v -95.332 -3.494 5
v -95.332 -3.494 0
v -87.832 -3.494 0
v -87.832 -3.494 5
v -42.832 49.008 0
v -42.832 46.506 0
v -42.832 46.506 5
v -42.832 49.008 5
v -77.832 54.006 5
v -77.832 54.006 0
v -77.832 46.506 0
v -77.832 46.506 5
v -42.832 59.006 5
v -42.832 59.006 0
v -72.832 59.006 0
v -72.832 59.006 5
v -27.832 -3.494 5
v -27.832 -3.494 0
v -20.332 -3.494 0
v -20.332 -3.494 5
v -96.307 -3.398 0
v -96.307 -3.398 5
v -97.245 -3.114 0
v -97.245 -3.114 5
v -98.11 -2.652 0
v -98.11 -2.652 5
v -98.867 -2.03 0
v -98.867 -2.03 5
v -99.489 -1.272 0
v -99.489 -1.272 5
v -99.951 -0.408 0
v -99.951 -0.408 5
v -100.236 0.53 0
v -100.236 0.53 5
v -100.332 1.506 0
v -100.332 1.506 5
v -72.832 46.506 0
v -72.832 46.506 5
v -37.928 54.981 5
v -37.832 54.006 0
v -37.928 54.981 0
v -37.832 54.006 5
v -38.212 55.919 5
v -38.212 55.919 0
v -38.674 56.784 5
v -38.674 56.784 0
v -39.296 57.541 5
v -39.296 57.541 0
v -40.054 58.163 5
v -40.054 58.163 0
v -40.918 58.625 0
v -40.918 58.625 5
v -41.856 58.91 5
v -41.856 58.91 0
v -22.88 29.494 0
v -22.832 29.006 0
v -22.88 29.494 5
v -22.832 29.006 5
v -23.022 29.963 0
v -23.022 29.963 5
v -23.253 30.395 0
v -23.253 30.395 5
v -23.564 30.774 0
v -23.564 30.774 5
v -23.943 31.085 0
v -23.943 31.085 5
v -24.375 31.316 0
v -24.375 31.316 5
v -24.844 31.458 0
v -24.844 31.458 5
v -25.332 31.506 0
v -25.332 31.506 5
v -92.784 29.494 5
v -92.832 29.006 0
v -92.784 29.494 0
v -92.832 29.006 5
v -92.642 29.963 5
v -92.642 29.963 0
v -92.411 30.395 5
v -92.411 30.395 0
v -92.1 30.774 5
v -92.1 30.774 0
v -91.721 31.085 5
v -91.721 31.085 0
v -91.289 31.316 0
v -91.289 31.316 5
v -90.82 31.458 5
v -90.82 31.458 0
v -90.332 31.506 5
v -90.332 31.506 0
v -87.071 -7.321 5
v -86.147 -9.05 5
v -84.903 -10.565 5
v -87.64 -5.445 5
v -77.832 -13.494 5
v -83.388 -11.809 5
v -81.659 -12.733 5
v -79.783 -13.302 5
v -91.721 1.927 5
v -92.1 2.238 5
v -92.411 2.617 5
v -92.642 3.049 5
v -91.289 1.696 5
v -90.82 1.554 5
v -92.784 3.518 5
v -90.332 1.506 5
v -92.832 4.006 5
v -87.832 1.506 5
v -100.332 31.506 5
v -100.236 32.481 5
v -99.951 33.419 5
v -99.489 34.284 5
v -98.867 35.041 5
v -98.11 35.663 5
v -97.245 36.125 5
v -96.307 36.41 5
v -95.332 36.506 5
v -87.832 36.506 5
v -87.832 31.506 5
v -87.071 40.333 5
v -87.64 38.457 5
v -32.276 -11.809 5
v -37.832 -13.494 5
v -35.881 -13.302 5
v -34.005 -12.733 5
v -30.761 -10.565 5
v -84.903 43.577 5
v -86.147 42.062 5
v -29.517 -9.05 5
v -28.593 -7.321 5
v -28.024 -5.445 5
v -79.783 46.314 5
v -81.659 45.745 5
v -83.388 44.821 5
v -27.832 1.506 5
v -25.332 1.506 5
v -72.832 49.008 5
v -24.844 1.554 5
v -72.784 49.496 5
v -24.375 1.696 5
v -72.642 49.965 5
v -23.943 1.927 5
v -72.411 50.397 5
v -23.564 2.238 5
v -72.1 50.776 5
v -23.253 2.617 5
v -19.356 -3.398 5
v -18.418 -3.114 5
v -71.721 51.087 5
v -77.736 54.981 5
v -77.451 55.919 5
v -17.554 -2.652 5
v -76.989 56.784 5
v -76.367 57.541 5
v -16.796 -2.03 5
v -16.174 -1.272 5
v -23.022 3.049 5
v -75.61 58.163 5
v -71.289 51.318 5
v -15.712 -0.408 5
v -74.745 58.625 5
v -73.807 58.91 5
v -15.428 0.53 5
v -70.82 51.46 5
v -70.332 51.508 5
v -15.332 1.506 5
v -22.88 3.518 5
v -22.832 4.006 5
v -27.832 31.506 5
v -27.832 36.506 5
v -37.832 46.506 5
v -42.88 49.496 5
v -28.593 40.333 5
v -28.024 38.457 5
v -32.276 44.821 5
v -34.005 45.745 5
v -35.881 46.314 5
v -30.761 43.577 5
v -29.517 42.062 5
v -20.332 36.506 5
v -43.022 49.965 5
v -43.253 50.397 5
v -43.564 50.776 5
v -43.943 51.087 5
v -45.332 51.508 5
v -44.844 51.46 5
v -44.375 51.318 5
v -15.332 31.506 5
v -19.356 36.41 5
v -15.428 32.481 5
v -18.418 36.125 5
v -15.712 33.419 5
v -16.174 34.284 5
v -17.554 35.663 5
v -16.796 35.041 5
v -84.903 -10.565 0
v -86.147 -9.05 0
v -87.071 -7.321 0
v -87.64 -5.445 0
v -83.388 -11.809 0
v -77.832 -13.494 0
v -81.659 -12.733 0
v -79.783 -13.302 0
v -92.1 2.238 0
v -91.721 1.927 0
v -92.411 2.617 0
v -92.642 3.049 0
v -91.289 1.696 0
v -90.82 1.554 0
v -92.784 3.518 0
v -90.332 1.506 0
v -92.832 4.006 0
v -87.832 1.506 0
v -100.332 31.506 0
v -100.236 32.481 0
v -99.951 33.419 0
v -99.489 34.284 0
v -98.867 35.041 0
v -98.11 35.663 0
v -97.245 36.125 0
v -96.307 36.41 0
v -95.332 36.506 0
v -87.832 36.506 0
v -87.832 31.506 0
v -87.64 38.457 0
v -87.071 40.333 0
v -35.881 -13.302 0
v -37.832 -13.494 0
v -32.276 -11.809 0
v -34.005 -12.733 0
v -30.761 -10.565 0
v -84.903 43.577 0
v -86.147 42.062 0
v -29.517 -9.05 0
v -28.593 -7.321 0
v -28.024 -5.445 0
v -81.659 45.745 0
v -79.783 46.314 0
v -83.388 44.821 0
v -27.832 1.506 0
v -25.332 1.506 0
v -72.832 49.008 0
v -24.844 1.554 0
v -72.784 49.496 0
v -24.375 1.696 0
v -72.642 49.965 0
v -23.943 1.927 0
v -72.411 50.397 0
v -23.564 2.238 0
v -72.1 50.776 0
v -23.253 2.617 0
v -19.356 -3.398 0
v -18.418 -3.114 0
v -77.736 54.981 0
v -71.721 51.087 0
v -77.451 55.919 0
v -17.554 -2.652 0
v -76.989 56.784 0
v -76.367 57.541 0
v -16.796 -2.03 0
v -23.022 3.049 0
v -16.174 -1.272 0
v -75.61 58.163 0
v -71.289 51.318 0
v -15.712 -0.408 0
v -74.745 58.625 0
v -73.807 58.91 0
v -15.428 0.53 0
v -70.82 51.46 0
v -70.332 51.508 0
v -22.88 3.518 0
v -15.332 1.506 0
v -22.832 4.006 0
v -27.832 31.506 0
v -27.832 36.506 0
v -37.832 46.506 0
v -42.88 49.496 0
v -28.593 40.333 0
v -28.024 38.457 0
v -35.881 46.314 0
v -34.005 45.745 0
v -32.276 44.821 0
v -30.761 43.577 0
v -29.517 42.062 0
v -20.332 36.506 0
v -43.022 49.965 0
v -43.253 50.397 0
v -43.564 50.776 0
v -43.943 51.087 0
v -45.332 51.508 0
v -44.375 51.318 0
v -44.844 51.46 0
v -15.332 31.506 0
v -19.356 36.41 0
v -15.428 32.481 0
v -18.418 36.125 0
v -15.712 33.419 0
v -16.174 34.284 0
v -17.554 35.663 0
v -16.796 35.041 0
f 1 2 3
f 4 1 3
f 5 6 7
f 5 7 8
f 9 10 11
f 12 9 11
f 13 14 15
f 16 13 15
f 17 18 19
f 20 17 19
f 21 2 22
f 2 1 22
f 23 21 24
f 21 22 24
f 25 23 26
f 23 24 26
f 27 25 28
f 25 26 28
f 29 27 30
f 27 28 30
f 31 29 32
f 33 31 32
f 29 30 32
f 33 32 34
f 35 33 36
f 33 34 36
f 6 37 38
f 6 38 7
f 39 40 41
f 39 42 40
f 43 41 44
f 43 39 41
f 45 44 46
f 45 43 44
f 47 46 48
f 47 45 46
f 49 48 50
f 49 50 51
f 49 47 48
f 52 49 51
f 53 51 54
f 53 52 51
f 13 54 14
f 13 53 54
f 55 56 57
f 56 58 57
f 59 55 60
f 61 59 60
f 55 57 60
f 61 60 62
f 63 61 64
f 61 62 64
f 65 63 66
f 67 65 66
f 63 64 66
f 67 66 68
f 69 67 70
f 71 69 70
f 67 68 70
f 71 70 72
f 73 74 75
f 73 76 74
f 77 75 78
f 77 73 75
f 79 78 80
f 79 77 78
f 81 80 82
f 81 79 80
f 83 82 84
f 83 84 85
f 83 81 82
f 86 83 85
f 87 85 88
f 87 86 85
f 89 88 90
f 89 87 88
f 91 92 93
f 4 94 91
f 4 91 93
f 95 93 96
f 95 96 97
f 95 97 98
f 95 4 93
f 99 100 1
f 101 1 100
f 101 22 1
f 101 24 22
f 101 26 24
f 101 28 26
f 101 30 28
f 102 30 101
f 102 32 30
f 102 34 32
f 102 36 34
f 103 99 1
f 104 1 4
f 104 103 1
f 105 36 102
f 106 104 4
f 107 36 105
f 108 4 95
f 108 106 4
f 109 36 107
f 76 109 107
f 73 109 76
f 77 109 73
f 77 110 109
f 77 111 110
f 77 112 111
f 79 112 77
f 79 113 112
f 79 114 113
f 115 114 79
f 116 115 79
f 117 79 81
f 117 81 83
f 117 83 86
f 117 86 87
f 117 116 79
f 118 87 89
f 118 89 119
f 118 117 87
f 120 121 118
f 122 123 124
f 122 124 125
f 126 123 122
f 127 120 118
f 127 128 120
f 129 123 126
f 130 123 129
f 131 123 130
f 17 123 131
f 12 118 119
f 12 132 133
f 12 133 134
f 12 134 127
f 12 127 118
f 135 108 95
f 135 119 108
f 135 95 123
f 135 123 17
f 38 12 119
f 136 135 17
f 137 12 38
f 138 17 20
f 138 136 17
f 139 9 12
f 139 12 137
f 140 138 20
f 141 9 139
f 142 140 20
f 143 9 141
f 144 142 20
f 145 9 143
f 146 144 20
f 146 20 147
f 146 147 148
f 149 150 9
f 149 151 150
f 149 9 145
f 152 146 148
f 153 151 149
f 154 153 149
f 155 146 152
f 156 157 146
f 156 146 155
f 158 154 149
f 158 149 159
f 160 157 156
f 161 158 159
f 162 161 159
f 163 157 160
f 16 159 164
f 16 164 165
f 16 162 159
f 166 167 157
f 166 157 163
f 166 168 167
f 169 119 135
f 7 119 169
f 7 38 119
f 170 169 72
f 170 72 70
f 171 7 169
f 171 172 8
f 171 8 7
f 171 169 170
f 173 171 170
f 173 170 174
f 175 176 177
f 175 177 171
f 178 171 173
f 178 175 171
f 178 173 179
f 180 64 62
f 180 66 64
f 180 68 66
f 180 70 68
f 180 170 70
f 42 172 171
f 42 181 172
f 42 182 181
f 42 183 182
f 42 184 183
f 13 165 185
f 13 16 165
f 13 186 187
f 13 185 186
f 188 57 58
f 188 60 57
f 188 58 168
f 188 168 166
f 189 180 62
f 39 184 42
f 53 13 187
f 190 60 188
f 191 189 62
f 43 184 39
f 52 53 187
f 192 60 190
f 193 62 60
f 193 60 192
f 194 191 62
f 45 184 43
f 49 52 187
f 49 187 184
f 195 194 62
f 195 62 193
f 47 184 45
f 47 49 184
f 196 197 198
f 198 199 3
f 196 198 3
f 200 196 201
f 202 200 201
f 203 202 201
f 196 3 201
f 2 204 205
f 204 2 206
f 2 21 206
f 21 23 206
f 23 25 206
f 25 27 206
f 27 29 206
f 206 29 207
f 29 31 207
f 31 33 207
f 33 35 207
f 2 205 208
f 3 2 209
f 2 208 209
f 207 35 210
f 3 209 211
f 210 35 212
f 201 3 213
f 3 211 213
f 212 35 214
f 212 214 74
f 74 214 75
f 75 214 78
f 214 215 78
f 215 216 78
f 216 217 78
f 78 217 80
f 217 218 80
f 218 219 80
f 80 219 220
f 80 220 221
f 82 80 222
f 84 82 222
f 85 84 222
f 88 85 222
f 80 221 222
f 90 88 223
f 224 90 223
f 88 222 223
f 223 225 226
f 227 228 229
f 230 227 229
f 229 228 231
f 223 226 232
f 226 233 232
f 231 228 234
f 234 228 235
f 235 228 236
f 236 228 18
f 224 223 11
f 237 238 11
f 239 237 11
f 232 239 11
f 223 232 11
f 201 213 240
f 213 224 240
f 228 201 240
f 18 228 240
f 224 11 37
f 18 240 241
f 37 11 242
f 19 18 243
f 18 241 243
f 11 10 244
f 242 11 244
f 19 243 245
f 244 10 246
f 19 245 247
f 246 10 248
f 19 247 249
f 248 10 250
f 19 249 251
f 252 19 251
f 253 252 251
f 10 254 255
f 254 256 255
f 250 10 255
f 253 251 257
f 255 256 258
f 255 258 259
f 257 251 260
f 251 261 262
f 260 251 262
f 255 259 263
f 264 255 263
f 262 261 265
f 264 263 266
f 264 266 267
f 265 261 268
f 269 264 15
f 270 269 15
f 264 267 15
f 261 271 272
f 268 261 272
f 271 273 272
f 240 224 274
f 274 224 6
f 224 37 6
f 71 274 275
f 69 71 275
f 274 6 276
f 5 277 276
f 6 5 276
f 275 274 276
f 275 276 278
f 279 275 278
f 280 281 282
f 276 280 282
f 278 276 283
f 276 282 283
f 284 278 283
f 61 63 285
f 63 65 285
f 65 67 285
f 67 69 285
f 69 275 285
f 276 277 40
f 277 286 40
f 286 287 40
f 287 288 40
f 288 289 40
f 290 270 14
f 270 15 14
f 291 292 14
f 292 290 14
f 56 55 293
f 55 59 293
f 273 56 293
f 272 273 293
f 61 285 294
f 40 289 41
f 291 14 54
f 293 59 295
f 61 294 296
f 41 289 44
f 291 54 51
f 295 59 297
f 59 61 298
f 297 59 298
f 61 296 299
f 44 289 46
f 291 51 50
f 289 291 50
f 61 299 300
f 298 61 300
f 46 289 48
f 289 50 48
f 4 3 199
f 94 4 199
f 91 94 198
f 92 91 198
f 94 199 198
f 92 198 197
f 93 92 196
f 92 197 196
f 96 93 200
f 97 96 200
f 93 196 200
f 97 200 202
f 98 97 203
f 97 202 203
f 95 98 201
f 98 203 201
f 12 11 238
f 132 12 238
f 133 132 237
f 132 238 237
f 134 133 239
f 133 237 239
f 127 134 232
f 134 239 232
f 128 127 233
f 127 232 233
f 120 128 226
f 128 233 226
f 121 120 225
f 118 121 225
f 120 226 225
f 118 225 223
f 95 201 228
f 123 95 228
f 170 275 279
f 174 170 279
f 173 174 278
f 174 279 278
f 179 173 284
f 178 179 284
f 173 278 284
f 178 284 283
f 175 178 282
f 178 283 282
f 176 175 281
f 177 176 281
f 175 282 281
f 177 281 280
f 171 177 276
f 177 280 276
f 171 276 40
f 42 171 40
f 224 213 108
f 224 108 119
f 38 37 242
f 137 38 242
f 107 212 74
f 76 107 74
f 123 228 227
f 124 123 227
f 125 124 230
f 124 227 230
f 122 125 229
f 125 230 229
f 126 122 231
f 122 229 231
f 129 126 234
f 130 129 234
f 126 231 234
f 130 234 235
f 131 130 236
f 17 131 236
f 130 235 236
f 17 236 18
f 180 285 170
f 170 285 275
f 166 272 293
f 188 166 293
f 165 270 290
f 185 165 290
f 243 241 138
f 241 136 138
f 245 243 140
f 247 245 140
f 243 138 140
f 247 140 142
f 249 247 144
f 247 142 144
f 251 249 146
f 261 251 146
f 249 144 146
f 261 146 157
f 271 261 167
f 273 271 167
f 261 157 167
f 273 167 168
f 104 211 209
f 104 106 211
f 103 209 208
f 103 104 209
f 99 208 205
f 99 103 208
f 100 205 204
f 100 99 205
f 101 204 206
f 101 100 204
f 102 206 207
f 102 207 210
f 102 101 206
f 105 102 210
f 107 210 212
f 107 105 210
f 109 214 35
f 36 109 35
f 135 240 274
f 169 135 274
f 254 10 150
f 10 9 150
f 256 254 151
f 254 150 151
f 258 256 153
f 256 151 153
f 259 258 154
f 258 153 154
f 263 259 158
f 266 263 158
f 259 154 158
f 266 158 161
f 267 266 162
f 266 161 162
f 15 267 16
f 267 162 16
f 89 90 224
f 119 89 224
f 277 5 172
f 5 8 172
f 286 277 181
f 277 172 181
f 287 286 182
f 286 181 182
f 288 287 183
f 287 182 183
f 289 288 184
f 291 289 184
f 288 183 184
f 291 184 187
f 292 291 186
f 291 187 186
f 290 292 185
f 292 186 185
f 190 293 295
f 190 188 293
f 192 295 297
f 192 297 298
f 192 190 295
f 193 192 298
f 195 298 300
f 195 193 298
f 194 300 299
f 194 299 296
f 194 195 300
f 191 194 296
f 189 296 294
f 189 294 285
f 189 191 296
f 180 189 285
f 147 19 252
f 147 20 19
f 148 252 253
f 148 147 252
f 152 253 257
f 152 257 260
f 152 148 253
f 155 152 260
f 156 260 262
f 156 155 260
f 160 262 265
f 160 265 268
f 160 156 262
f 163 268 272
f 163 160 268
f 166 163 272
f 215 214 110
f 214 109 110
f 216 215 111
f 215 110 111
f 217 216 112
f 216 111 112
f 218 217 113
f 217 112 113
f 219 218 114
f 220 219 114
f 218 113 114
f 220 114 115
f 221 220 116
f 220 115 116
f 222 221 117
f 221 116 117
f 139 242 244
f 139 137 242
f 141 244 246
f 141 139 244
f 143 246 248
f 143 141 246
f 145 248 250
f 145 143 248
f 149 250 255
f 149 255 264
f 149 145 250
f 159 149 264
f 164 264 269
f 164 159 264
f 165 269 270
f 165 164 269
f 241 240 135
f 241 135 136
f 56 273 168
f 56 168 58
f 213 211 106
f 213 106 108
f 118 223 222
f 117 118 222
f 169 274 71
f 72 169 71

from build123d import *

# Parameters (mm, degrees)
SKETCH1_W           = 5
SKETCH1_H           = 30
SKETCH1_W_2         = 30
SKETCH1_H_2         = 5.002209569
BOSS_EXTRUDE2_DEPTH = 5
FILLET1_R           = 5
FILLET2_R           = 2.5


with BuildPart() as part:
    # Sketch1 → Boss-Extrude2 (new body)
    with BuildSketch(Plane.XY):
        with BuildLine():
            Line((-77.831835846, -13.494171848), (-37.831835846, -13.494171848))
            ThreePointArc((-37.831835846, -13.494171848), (-30.760768034, -10.56523966), (-27.831835846, -3.494171848))
            Line((-27.831835846, -3.494171848), (-15.331835846, -3.494171848))
            Line((-15.331835846, -3.494171848), (-15.331835846, 36.505828152))
            Line((-15.331835846, 36.505828152), (-27.831835846, 36.505828152))
            ThreePointArc((-27.831835846, 36.505828152), (-30.760768034, 43.576895964), (-37.831835846, 46.505828152))
            Line((-37.831835846, 46.505828152), (-37.831835846, 59.005828152))
            Line((-37.831835846, 59.005828152), (-77.831835846, 59.005828152))
            Line((-77.831835846, 59.005828152), (-77.831835846, 46.505828152))
            ThreePointArc((-77.831835846, 46.505828152), (-84.902903658, 43.576895964), (-87.831835846, 36.505828152))
            Line((-87.831835846, 36.505828152), (-100.331835846, 36.505828152))
            Line((-100.331835846, 36.505828152), (-100.331835846, -3.494171848))
            Line((-100.331835846, -3.494171848), (-87.831835846, -3.494171848))
            ThreePointArc((-87.831835846, -3.494171848), (-84.902903658, -10.56523966), (-77.831835846, -13.494171848))
        make_face()
        with Locations((-90.331835846, 16.505828152)):
            Rectangle(SKETCH1_W, SKETCH1_H, mode=Mode.SUBTRACT)
        with Locations((-57.831835846, 49.006932937)):
            Rectangle(SKETCH1_W_2, SKETCH1_H_2, mode=Mode.SUBTRACT)
        with Locations((-25.331835846, 16.505828152)):
            Rectangle(SKETCH1_W, SKETCH1_H, mode=Mode.SUBTRACT)
    extrude(amount=BOSS_EXTRUDE2_DEPTH)

    # Fillet1
    fillet1_edges = [part.edges().sort_by_distance(p)[0] for p in [
        (-15.331835846, 36.505828152, 2.5),
        (-15.331835846, -3.494171848, 2.5),
        (-100.331835846, -3.494171848, 2.5),
        (-100.331835846, 36.505828152, 2.5),
        (-77.831835846, 59.005828152, 2.5),
        (-37.831835846, 59.005828152, 2.5),
    ]]
    fillet(fillet1_edges, radius=FILLET1_R)

    # Fillet2
    fillet2_edges = [part.edges().sort_by_distance(p)[0] for p in [
        (-22.831835846, 31.505828152, 2.5),
        (-22.831835846, 1.505828152, 2.5),
        (-92.831835846, 31.505828152, 2.5),
        (-92.831835846, 1.505828152, 2.5),
        (-72.831835846, 51.508037721, 2.5),
        (-42.831835846, 51.508037721, 2.5),
    ]]
    fillet(fillet2_edges, radius=FILLET2_R)


solid = part.part
